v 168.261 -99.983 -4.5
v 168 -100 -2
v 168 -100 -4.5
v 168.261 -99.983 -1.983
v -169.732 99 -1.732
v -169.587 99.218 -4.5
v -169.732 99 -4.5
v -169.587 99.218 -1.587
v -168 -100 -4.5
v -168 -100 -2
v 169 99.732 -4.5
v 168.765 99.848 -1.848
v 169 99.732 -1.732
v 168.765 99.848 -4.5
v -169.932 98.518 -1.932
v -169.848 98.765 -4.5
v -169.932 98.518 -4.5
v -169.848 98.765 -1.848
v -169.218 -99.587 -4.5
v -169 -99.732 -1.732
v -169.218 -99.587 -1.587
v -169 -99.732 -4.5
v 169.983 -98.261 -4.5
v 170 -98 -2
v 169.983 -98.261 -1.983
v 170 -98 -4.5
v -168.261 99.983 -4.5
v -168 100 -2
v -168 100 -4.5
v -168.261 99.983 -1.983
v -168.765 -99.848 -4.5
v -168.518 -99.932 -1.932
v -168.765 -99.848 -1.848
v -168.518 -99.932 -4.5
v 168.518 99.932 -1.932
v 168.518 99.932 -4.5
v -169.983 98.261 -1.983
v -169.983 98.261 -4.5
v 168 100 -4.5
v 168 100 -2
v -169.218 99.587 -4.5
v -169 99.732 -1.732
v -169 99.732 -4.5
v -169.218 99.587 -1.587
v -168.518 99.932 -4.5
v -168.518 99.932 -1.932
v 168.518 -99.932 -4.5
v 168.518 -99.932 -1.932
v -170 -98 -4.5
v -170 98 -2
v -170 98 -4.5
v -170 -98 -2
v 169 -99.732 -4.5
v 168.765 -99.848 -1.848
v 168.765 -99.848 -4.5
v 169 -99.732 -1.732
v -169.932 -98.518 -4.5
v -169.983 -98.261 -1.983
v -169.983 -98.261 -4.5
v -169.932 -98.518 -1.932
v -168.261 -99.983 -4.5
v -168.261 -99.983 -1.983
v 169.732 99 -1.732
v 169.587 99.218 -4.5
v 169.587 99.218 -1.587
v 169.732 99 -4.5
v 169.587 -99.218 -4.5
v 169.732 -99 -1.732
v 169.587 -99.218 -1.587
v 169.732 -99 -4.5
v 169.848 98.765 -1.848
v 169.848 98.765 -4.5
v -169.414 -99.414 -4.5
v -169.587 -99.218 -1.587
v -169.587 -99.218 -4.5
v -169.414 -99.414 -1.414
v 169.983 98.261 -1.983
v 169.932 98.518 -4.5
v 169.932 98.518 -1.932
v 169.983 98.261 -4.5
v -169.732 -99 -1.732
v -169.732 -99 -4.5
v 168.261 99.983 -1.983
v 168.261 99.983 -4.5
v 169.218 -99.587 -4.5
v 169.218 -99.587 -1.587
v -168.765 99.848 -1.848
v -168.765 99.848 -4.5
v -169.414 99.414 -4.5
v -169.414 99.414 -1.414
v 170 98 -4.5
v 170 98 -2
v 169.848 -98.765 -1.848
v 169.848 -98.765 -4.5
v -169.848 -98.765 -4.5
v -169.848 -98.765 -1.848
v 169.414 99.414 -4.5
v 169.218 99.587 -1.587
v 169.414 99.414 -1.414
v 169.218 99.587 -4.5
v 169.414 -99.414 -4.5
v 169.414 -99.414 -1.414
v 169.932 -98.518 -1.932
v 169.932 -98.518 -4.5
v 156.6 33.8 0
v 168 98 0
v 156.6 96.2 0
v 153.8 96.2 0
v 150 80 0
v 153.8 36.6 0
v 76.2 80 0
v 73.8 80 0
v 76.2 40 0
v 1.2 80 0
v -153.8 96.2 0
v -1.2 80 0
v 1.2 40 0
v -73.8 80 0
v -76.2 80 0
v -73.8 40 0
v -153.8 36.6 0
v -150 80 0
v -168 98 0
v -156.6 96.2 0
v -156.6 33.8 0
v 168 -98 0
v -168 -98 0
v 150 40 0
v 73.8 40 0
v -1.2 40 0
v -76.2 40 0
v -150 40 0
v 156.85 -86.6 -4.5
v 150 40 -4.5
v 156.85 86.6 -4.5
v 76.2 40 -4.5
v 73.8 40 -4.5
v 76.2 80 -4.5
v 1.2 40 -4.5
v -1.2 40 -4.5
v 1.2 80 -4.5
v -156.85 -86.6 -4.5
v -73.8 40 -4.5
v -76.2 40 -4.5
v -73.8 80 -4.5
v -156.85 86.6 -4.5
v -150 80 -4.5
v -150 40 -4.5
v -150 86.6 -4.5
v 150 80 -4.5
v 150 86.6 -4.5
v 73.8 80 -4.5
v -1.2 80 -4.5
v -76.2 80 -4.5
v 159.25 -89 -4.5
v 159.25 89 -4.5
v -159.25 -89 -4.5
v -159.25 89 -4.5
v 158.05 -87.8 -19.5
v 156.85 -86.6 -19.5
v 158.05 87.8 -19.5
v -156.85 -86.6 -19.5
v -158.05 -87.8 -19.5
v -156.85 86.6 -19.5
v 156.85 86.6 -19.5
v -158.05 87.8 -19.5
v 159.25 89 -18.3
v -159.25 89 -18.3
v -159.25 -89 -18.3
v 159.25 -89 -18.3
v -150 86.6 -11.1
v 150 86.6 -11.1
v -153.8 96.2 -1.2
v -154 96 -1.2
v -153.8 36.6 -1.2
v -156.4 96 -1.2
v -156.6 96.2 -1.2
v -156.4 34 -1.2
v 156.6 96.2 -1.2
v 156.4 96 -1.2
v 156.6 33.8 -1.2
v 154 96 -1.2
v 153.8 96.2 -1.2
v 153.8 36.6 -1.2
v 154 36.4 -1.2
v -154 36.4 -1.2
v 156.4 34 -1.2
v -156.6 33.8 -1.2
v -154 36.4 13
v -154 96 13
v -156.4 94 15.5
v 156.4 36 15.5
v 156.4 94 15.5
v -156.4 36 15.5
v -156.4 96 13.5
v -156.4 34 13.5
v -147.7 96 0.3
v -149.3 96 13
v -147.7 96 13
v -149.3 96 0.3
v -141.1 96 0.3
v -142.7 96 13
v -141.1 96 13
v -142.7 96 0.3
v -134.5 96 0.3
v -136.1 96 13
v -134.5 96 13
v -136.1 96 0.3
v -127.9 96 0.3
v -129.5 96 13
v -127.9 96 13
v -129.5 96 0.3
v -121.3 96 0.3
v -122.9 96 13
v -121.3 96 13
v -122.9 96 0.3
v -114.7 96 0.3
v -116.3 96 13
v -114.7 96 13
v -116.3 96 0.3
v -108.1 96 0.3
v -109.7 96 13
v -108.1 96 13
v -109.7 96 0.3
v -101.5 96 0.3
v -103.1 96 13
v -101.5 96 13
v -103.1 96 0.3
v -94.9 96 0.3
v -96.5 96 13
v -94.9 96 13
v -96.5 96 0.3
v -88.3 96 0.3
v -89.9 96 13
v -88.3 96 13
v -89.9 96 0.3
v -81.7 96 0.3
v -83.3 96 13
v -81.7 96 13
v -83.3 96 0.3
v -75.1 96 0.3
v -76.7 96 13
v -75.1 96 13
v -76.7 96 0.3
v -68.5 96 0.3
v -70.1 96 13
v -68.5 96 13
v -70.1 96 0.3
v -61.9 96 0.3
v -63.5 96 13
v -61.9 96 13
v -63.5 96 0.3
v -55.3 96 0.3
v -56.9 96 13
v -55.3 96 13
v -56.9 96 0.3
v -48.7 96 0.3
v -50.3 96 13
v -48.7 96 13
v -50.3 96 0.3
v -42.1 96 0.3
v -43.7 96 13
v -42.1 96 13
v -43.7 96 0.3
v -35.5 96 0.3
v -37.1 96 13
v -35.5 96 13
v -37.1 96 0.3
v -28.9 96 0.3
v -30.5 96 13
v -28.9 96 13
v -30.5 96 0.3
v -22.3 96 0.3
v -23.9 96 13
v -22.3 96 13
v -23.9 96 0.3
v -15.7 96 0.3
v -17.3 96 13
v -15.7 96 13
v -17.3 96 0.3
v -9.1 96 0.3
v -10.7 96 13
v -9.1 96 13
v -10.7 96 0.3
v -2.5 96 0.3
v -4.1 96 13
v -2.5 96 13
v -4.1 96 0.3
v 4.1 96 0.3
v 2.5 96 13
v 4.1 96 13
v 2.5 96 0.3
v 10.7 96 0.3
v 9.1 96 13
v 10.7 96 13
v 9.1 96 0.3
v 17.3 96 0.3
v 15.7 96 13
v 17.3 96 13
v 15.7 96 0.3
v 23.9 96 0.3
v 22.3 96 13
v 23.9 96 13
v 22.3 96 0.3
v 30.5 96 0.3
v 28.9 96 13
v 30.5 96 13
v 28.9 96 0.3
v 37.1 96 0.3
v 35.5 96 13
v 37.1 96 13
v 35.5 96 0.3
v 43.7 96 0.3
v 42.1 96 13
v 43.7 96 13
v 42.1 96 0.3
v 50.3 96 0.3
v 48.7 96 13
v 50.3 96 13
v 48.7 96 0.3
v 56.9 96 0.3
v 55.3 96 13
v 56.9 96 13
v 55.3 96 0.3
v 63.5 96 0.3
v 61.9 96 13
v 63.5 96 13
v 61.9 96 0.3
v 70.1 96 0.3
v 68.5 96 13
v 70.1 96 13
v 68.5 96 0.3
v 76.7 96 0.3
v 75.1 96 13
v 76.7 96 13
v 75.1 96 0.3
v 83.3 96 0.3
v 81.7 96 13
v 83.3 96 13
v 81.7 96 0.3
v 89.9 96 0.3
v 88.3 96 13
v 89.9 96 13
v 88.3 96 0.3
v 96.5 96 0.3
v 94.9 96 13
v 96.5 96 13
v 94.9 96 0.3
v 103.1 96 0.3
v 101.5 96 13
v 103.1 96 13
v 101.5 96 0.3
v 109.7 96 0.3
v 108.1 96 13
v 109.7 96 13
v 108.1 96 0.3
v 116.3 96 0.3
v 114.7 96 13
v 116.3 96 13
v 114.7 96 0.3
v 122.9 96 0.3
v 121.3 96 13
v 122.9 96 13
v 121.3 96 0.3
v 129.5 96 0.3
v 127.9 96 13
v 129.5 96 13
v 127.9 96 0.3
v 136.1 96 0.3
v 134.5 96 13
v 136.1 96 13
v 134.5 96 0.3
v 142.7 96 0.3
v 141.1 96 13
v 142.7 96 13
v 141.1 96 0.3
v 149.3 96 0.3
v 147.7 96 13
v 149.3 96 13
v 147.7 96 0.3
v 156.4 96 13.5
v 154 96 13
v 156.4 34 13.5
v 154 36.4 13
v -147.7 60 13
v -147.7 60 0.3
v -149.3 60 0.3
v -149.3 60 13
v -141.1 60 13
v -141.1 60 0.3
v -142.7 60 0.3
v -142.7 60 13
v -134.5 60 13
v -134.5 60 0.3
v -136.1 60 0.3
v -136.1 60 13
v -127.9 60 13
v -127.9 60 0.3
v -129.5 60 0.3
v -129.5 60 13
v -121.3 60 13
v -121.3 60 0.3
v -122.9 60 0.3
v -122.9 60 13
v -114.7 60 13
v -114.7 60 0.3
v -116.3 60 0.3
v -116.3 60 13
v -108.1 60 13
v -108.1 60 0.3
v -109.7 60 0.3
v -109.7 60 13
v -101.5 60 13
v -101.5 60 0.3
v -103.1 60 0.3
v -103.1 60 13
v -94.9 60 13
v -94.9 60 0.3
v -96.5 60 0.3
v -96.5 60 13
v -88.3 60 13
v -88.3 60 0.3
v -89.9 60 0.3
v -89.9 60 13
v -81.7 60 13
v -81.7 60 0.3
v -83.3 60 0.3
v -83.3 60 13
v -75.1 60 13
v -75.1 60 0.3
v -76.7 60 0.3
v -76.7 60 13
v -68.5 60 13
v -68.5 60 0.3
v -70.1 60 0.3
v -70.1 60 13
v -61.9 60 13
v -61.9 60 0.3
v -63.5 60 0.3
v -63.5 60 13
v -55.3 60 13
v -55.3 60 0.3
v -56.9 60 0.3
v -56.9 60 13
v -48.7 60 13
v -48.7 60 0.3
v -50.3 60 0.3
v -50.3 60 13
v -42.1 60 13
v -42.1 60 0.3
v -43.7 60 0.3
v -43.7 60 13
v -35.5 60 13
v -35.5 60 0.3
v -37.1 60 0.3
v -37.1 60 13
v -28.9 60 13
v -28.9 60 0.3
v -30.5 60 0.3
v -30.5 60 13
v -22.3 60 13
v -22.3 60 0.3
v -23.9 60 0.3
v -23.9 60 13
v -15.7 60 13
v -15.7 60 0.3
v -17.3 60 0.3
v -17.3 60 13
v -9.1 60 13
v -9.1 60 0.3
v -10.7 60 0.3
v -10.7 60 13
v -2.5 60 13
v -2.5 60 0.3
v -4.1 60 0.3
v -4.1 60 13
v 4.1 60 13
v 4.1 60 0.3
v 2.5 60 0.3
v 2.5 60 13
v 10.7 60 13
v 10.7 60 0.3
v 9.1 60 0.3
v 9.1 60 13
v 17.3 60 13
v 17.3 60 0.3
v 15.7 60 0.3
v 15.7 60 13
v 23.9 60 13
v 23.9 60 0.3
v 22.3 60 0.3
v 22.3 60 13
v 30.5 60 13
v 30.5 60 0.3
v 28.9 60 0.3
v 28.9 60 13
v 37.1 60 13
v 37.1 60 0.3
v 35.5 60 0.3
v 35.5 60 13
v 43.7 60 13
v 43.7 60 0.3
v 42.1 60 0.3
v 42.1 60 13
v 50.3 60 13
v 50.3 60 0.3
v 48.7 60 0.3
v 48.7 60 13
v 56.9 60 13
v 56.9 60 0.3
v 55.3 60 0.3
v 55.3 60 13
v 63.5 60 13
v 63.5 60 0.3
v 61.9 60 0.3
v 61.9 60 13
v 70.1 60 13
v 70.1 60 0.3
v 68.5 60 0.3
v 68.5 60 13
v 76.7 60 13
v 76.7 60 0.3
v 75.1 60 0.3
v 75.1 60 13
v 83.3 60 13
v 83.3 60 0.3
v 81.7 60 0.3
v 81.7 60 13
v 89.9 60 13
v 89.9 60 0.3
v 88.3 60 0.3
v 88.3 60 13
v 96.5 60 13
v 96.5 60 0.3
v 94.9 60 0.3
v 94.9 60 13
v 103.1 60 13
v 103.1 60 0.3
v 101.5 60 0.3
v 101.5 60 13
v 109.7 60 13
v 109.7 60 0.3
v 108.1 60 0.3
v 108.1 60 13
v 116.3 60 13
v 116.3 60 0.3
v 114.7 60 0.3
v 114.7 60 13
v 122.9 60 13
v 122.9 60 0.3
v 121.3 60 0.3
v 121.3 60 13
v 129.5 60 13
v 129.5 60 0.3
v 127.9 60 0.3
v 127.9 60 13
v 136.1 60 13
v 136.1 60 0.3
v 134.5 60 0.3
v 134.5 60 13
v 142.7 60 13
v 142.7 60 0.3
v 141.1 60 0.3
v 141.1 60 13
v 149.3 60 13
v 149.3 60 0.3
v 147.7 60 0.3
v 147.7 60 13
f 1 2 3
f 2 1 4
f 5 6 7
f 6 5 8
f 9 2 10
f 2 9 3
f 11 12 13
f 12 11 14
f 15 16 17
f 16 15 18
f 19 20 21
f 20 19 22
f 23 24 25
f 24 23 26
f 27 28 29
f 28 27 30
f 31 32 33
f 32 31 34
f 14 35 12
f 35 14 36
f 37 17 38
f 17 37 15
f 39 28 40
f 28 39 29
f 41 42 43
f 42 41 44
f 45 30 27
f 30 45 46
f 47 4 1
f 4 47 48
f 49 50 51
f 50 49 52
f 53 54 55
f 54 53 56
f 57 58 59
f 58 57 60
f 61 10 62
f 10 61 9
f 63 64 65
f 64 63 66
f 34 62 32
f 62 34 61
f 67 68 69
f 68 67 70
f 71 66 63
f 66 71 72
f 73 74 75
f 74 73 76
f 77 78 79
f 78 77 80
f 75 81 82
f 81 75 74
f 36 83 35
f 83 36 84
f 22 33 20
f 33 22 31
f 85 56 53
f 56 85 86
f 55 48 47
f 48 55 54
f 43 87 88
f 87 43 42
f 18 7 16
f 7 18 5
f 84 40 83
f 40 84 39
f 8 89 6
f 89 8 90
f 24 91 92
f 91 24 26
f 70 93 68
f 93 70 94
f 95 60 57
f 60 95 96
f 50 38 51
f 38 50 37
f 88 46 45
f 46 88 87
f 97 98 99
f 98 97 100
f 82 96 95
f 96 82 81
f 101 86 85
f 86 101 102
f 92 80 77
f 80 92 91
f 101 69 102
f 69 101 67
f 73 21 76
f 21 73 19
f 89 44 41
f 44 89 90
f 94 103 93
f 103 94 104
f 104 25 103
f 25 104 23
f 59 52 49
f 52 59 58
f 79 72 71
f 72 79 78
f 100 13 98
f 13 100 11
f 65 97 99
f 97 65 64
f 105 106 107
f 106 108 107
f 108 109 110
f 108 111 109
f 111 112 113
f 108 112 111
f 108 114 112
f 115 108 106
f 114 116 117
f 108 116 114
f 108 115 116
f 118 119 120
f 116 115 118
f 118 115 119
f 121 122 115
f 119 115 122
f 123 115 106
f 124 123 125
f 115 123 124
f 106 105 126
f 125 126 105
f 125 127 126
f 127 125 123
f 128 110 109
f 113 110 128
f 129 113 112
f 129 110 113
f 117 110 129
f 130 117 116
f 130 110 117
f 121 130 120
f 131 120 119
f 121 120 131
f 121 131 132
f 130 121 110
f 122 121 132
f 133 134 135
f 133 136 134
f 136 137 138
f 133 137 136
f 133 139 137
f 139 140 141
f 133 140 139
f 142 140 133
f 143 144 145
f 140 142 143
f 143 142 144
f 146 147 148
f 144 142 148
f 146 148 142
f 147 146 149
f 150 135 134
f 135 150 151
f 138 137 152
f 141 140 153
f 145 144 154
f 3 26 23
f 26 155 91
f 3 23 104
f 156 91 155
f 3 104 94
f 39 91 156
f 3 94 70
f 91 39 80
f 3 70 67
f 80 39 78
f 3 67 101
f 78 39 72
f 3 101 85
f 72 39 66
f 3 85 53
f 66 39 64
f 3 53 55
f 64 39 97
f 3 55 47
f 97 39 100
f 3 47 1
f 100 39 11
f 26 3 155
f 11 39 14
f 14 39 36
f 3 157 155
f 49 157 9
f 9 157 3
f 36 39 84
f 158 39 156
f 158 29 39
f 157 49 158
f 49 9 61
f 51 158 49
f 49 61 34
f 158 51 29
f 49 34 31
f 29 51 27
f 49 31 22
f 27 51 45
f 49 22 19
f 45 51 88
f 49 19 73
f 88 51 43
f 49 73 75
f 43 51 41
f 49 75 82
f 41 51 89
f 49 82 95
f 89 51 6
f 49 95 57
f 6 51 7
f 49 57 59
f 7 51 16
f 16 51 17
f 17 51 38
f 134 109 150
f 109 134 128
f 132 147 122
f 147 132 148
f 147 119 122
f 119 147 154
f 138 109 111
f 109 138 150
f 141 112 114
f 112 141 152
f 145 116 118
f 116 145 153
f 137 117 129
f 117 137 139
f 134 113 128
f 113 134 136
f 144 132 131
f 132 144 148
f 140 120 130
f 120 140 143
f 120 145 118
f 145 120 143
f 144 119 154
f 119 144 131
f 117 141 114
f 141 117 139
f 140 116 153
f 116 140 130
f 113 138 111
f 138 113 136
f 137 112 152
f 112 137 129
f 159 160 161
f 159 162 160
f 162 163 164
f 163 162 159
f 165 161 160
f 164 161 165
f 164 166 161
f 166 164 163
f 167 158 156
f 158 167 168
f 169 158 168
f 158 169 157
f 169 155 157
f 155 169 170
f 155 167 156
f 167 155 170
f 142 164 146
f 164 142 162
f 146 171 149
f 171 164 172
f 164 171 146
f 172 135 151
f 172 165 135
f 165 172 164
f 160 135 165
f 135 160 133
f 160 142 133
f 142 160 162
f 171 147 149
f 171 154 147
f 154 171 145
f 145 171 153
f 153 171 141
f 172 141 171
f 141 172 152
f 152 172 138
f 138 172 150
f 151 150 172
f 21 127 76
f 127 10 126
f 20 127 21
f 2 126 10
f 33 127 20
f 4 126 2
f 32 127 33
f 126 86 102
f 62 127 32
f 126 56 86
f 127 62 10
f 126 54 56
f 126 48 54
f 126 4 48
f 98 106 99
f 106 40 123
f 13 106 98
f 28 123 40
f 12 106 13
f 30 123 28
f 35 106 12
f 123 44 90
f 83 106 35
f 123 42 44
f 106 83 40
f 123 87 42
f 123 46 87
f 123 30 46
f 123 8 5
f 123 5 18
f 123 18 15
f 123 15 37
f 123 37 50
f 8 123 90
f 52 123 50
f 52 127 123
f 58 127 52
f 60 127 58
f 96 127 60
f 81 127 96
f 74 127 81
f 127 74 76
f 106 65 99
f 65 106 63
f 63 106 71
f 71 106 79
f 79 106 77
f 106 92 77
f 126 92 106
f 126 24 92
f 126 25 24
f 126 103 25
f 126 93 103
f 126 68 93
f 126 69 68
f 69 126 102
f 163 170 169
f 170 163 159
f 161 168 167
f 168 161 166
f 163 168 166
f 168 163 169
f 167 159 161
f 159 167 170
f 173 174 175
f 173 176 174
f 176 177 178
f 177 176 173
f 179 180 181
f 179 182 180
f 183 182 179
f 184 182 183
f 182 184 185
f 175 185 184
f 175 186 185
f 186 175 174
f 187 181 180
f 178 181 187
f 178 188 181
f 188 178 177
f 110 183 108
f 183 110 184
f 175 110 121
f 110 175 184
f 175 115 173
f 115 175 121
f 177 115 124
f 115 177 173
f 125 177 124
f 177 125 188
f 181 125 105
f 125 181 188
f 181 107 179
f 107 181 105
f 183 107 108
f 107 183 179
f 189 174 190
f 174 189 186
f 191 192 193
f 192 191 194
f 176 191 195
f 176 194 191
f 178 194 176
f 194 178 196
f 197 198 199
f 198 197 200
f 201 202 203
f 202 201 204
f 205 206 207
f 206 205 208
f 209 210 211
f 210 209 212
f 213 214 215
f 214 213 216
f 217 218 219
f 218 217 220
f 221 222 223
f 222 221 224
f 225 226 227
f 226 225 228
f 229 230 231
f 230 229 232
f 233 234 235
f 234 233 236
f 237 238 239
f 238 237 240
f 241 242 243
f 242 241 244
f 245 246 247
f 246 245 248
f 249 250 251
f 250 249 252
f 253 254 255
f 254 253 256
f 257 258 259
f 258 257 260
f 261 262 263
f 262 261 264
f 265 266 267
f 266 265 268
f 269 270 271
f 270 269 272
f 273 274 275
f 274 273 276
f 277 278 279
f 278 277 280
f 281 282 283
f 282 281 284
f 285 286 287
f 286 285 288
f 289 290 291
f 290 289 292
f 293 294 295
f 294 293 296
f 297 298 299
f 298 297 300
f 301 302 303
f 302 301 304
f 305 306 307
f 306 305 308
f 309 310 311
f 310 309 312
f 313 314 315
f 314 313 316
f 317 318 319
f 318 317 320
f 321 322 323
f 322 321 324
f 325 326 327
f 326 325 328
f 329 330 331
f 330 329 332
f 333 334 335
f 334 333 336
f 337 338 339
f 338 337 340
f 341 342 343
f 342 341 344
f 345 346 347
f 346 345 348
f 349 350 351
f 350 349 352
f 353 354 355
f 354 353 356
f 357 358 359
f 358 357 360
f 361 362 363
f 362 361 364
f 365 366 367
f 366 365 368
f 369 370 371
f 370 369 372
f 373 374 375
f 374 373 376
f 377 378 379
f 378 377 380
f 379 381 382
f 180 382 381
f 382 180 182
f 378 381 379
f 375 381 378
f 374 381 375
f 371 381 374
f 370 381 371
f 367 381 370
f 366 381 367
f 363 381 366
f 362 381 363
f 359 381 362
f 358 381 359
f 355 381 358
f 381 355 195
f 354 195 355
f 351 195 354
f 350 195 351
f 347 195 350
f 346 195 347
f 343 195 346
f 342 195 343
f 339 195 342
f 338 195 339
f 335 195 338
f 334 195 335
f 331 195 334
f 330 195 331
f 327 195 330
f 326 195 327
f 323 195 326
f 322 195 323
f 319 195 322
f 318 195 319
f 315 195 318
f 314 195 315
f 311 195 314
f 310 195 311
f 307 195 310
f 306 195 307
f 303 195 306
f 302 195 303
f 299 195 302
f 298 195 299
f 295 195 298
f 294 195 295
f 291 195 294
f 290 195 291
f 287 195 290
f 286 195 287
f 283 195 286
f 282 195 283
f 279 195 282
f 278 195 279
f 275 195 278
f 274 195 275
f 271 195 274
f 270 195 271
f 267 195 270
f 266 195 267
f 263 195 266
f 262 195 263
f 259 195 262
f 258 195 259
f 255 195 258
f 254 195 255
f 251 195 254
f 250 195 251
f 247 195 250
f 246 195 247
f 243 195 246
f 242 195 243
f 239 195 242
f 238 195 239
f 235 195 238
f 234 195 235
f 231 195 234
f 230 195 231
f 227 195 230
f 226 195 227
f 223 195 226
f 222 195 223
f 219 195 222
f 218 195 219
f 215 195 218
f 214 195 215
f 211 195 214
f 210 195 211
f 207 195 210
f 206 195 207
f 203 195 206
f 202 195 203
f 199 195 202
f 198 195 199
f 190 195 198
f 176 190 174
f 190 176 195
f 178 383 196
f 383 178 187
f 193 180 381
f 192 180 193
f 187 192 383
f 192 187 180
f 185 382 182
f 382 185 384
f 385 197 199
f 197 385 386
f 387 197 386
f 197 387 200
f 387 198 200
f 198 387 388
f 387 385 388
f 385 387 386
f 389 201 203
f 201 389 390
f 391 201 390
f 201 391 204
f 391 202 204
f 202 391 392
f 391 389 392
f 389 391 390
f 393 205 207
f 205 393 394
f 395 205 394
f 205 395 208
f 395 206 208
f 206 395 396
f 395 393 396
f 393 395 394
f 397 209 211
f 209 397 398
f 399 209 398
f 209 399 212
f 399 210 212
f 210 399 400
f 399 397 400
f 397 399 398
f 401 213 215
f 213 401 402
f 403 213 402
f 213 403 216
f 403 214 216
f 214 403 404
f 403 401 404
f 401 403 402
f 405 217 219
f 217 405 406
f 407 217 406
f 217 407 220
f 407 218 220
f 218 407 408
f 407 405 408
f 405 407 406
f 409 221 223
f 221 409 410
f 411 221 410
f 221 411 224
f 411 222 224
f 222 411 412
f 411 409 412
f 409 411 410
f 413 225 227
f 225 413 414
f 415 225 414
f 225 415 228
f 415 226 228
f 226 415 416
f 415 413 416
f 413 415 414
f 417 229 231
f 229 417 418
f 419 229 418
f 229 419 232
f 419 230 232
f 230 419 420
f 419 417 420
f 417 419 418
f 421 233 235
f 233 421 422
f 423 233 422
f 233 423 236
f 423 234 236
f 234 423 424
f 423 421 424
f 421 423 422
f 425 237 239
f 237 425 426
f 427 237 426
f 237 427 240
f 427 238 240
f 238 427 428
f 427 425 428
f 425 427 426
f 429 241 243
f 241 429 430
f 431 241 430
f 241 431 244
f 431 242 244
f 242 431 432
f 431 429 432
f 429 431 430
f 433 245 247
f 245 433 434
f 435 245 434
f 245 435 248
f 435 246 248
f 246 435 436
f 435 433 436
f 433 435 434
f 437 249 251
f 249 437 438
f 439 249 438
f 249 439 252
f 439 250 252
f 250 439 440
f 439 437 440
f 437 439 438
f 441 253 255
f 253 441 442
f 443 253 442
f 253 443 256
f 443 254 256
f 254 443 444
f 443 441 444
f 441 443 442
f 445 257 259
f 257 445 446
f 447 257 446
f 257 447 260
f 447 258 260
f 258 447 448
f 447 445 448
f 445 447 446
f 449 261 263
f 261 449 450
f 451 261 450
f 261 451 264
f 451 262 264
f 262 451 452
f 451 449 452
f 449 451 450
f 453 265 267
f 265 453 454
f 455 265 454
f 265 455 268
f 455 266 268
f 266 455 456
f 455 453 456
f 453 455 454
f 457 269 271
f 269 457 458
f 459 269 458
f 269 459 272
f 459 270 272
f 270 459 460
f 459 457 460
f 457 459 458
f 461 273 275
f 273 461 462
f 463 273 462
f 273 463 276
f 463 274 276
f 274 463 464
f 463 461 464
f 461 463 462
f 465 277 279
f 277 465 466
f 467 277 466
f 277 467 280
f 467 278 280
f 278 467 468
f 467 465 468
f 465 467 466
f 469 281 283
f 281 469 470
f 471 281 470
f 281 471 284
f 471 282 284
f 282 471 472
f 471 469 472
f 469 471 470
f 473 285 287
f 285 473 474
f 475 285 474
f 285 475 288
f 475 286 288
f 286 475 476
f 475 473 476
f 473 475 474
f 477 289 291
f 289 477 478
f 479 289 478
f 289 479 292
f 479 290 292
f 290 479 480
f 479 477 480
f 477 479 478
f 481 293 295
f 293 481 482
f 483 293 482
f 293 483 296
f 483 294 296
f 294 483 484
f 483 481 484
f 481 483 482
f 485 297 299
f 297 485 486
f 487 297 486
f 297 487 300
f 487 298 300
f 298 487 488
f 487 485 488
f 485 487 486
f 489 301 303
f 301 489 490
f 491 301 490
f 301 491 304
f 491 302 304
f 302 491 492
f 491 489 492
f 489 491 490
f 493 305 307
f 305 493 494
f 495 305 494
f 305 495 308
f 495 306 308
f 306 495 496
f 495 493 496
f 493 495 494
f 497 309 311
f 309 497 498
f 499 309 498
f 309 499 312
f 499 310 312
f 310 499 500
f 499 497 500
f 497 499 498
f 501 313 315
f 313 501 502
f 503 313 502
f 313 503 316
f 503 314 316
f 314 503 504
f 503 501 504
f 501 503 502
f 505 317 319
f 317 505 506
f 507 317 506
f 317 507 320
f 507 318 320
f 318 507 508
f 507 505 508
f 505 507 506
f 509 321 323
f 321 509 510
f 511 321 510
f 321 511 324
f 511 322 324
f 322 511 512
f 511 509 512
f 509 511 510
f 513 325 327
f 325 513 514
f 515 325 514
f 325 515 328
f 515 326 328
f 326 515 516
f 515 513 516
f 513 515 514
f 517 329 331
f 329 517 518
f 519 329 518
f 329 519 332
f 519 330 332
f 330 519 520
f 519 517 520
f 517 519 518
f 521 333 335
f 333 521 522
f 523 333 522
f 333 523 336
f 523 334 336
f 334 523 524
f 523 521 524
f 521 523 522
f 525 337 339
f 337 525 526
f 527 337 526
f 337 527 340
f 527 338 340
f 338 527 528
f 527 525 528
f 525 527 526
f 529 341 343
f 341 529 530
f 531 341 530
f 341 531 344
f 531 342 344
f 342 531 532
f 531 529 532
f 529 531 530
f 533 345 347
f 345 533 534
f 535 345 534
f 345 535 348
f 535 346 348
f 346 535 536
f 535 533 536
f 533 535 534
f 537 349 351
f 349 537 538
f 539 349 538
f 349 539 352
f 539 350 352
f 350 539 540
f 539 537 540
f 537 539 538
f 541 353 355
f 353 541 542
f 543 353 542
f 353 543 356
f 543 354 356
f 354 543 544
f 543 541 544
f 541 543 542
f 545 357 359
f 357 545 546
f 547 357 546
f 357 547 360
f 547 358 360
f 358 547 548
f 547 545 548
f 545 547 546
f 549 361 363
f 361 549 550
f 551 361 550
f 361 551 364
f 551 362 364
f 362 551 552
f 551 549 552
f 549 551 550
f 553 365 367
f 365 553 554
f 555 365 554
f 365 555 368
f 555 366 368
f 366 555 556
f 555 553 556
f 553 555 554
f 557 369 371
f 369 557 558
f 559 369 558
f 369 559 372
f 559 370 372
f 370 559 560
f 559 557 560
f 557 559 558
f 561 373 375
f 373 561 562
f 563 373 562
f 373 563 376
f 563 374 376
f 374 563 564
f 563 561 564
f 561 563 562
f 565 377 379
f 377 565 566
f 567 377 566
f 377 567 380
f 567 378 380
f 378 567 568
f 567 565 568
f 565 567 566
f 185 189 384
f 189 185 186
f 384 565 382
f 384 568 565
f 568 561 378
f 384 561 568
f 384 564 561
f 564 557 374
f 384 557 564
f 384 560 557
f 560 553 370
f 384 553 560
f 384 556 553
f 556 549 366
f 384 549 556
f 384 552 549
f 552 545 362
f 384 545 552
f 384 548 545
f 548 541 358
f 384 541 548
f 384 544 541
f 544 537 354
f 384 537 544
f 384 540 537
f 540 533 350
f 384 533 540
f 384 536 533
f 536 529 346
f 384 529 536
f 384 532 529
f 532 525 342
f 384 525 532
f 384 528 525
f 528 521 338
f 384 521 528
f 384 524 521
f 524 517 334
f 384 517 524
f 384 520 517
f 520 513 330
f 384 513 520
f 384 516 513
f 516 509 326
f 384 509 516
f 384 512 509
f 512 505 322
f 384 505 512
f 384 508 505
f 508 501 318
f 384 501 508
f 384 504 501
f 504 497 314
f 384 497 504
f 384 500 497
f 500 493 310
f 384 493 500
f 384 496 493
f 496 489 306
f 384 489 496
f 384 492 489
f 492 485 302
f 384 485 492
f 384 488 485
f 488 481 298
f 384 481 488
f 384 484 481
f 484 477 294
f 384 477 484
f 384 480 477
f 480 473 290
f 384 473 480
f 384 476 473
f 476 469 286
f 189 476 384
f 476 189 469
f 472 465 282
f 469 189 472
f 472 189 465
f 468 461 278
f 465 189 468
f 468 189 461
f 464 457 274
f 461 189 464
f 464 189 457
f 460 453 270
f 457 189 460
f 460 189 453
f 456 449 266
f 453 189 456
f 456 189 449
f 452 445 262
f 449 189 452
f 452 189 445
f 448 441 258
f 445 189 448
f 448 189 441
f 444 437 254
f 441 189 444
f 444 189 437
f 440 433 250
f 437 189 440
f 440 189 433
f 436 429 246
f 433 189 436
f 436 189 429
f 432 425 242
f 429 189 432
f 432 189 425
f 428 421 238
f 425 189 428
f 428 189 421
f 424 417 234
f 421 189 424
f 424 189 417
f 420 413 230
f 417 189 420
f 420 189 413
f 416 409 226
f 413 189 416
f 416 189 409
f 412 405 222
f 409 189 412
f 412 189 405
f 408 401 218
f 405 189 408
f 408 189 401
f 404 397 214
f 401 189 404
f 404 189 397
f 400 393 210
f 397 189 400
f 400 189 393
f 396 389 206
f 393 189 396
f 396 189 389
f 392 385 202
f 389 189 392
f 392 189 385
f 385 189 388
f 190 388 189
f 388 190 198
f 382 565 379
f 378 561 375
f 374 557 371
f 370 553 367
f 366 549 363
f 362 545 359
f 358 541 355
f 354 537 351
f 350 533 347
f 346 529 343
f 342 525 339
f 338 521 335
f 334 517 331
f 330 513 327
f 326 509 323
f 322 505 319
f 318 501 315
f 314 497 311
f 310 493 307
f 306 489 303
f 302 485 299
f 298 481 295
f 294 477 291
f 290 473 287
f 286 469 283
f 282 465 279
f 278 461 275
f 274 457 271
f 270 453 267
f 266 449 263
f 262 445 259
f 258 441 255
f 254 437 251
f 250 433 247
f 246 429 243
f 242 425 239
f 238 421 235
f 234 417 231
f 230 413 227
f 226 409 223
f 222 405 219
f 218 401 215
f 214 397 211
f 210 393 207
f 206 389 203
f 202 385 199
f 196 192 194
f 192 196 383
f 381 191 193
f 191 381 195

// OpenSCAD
// ============================================================
// Hallway 90-degree DIVERTER vent - cabinet sits over the register.
// Problem: floor register is fully under a cabinet (air gaps only at the
// four corners, ~20 cm); straight-up flow is blocked. This cover seals the
// top and BENDS the flow 90 deg about the LONG axis: air exits horizontally
// through a low scoop hood along the room-facing long edge, thrown along
// the floor toward the open room (away from the closet side).
//
// MEASUREMENTS (taken on site):
//   floor-plane opening 320 x 180, dropdown (duct) 300 x 160 at a measured
//   18-20 mm below floor top (worst case 18 used). Old grill 355 x 204 flange / 275 x 125 louver area.
//
// TWO-PIECE (print-physics driven): a one-piece raised hood cannot print
// support-free top-face-down (plate would float 15 mm above the bed -
// playbook rule: re-check every feature in PRINT orientation).
//   PAN  - flush drop-in: 10 mm lip, 4.5 plate, skirt into the 320x180
//          opening, 300 x 40 slot at the room edge, 45-deg corner deflector
//          turning the plenum flow up into the slot.
//          Print TOP FACE DOWN, flat, zero supports (house pattern).
//   HOOD - low scoop over the slot, 20 mm total above floor (user cap),
//          open room-facing side with deep vertical straightening fins,
//          gaps <= 5 mm (finger-safety rule).
//          Print ROOF FACE DOWN, zero supports; both show faces get PEI
//          texture. Walls drop into a locating groove in the pan; CA glue.
// AIR DIRECTION: exits toward +Y. Install with +Y facing the open room.
// Material: PETG (heater supply). 0.2 mm, 4 walls.
// Design orientation: pan plate top z=0, pan extends -z, hood extends +z.
// ============================================================

/* [What to render] */
RENDER_PART = "assembly";   // ["pan", "hood", "assembly", "plinth"]

/* [Opening - CONFIRM BY MEASURE] */
floor_open_L = 320;   // x, long axis, opening in the floor plane
floor_open_W = 180;   // y
ledge_depth  = 18.0;  // floor top down to the 300x160 ledge -
                      // MEASURED 18-20 mm (correction from an early "~1 inch" estimate);
                      // sized to the WORST CASE 18 (playbook rule)
duct_L = 300; duct_W = 160;
end_clear  = 0.75;    // skirt clearance per end
side_clear = 1.0;     // skirt clearance per side

/* [Pan body] */
lip_w   = 10.0;       // floor-resting lip all around
plate_T = 4.5;
skirt_depth = 15.0;   // below floor plane; must clear the 18 mm ledge
skirt_wall  = 2.4;
edge_ch = 2.0; corner_r = 2.0;

/* [Slot + deflector] */
slot_L  = 300;        // x extent of the slot (centered)
slot_y0 = 40;         // slot near edge (closet side of slot)
slot_y1 = 80;         // slot far edge (room side)
n_slot_ribs = 3;      // full-thickness ribs bracing the slot span
slot_rib_t  = 2.4;

/* [Hood] */
scoop_cap  = 20.0;    // max height above FLOOR plane (user limit)
hood_wall  = 2.4;
roof_T     = 2.5;
hood_y0    = 34;      // back wall outer face (closet side)
hood_y1    = 96;      // open outlet face (room side)
hood_margin_x = 4;    // hood extends past slot ends
groove_depth = 1.2; groove_clear = 0.2;
fin_t = 1.6;
fin_gap = 5.0;        // FINGER SAFETY <= 5
fin_y0 = 60;          // fins run fin_y0 .. hood_y1 (deep = straight throw)
fin_z_clear = 0.3;    // fin bottom vs plate top
hood_edge_ch = 2.0;

// ---------------- derived ----------------
plate_L = floor_open_L + 2*lip_w;            // 340
plate_W = floor_open_W + 2*lip_w;            // 200
skirt_L = floor_open_L - 2*end_clear;        // 318.5
skirt_W = floor_open_W - 2*side_clear;       // 178
skirt_in_L = skirt_L - 2*skirt_wall;
skirt_in_W = skirt_W - 2*skirt_wall;
hood_h  = scoop_cap - plate_T;               // 15.5 above plate top
hood_L  = slot_L + 2*(hood_wall + hood_margin_x);   // 312.8 (a stale "308" here once named an export file; see README)
hood_D  = hood_y1 - hood_y0;                 // 62
fin_pitch = fin_gap + fin_t;                 // 6.6
fin_H   = hood_h - roof_T;                   // 13 (roof underside to plate)
n_fins  = floor((hood_L - 2*hood_wall - fin_gap) / fin_pitch);
fins_span = n_fins*fin_pitch + fin_t;
defl_d  = skirt_in_W/2 - slot_y1;            // corner-fillet wedge depth
$fn = 48;

assert(plate_L <= 350 && plate_W <= 320, "pan exceeds bed");
assert(hood_L <= 350 && hood_D <= 320, "hood exceeds bed");
assert(fin_gap <= 5.01, "finger-safety: fin gap > 5");
assert(skirt_depth <= ledge_depth - 2, "skirt hits the ledge");
assert(slot_L/2 <= skirt_in_L/2 - 2 && slot_y1 <= skirt_in_W/2 - 2,
       "slot exceeds skirt interior");
assert(hood_y0 + hood_wall + groove_clear < slot_y0,
       "back-wall groove intersects slot");
assert(hood_L/2 - hood_wall - groove_clear > slot_L/2 + 1,
       "end-wall groove too close to slot end");
assert(hood_L/2 <= plate_L/2 - 2 && hood_y1 <= plate_W/2 - 2,
       "hood exceeds plate");
assert(plate_T + hood_h <= scoop_cap + 0.01, "scoop over user height cap");
echo(str("outlet free area ~",
     round((hood_L - 2*hood_wall - ((n_fins+1)*fin_t)) * fin_H / 100),
     " cm2  (slot ", round((slot_L*(slot_y1-slot_y0)
       - n_slot_ribs*slot_rib_t*(slot_y1-slot_y0))/100),
     " cm2, duct ", round(duct_L*duct_W/100), " cm2)"));
echo(str("n_fins ", n_fins, "  hood total above floor ", plate_T + hood_h));

// ---------------- helpers ----------------
module ch_x(y, z, c, l) { translate([0, y, z]) rotate([45, 0, 0])
    cube([l, c*sqrt(2), c*sqrt(2)], center=true); }
module ch_y(x, z, c, l) { translate([x, 0, z]) rotate([0, 0, 90]) rotate([45, 0, 0])
    cube([l, c*sqrt(2), c*sqrt(2)], center=true); }
module rrect(l, w, r) { offset(r=r) offset(delta=-r) square([l, w], center=true); }

// ============================================================ PAN
module pan_plate() {
    difference() {
        translate([0, 0, -plate_T]) linear_extrude(plate_T)
            rrect(plate_L, plate_W, corner_r);
        // slot (ribs re-added after)
        translate([-slot_L/2, slot_y0, -plate_T - 1])
            cube([slot_L, slot_y1 - slot_y0, plate_T + 2]);
    }
    // full-thickness ribs bracing the slot span (hidden under the hood)
    for (i = [1 : n_slot_ribs])
        translate([-slot_L/2 + i*slot_L/(n_slot_ribs+1) - slot_rib_t/2,
                   slot_y0, -plate_T])
            cube([slot_rib_t, slot_y1 - slot_y0, plate_T]);
}
module pan_skirt() {
    translate([0, 0, -plate_T - skirt_depth]) linear_extrude(skirt_depth)
        difference() { square([skirt_L, skirt_W], center=true);
                       square([skirt_in_L, skirt_in_W], center=true); }
}
// 45-deg wedge filling the dead-end between slot far edge and skirt wall:
// +y plenum flow hits it and turns up into the slot.
module deflector() {
    translate([-slot_L/2, 0, 0]) rotate([90, 0, 90]) linear_extrude(slot_L)
        polygon([[slot_y1, -plate_T], [skirt_in_W/2, -plate_T],
                 [skirt_in_W/2, -plate_T - defl_d]]);
}
// locating groove for hood back + end walls (front face is open)
module hood_groove() {
    gw = hood_wall + 2*groove_clear;
    translate([0, 0, -groove_depth]) linear_extrude(groove_depth + 1) {
        // back wall groove
        translate([-hood_L/2 - groove_clear, hood_y0 - groove_clear])
            square([hood_L + 2*groove_clear, gw]);
        // end wall grooves: wall sx=+1 spans x [hood_L/2-hood_wall, hood_L/2]
        for (sx = [-1, 1])
            translate([sx>0 ? hood_L/2 - hood_wall - groove_clear
                            : -hood_L/2 - groove_clear,
                       hood_y0 - groove_clear])
                square([gw, hood_D + 2*groove_clear]);
    }
}
module pan_chamfers() {
    ch_x(-plate_W/2, 0, edge_ch, plate_L + 4); ch_x(plate_W/2, 0, edge_ch, plate_L + 4);
    ch_y(-plate_L/2, 0, edge_ch, plate_W + 4); ch_y(plate_L/2, 0, edge_ch, plate_W + 4);
    // skirt lead-in
    ch_x(-skirt_W/2, -plate_T - skirt_depth, 1.2, skirt_L + 4);
    ch_x( skirt_W/2, -plate_T - skirt_depth, 1.2, skirt_L + 4);
    ch_y(-skirt_L/2, -plate_T - skirt_depth, 1.2, skirt_W + 4);
    ch_y( skirt_L/2, -plate_T - skirt_depth, 1.2, skirt_W + 4);
}
module pan() {
    difference() {
        union() { pan_plate(); pan_skirt(); deflector(); }
        pan_chamfers();
        hood_groove();
    }
}

// ============================================================ HOOD
// Modeled in ASSEMBLED position: walls z = -groove_depth .. hood_h,
// roof top at z = hood_h. Open face at y = hood_y1 (+y, room side).
module hood_body() {
    // back wall
    translate([-hood_L/2, hood_y0, -groove_depth])
        cube([hood_L, hood_wall, groove_depth + hood_h]);
    // end walls
    for (sx = [-1, 1])
        translate([sx*hood_L/2 - (sx>0 ? hood_wall : 0), hood_y0, -groove_depth])
            cube([hood_wall, hood_D, groove_depth + hood_h]);
    // roof
    translate([-hood_L/2, hood_y0, hood_h - roof_T])
        cube([hood_L, hood_D, roof_T]);
    // fins: vertical straighteners, fused to roof, deep along y
    fin_x0 = -fins_span/2;
    for (k = [0 : n_fins])
        translate([fin_x0 + k*fin_pitch, fin_y0, fin_z_clear])
            cube([fin_t, hood_y1 - fin_y0, hood_h - fin_z_clear]);
}
module hood_chamfers() {
    // roof top perimeter, 45 deg (prints flaring from bed, roof-down)
    ch_x(hood_y0, hood_h, hood_edge_ch, hood_L + 4);
    ch_x(hood_y1, hood_h, hood_edge_ch, hood_L + 4);
    ch_y(-hood_L/2, hood_h, hood_edge_ch, hood_D + 4);
    ch_y( hood_L/2, hood_h, hood_edge_ch, hood_D + 4);
}
module hood() {
    difference() {
        hood_body();
        hood_chamfers();
    }
}

// ============================================================ PLINTH
// TRUE ONE-PIECE alternative: the entire cover is a 20 mm low box -
// flat roof at the scoop cap height, perimeter walls resting on the
// floor, fins built into the room-facing long edge, skirt hanging into
// the opening. ONE print, no glue. Requires ~20 mm clearance under the
// cabinet across the WHOLE footprint (not just the scoop strip).
// Prints TOP FACE DOWN: the whole roof is layer 1 on the PEI; walls,
// skirt, ribs, fins all grow straight up. Zero supports.
// Airflow bonus vs two-piece: full-width 17.5 mm channel -> ~40 cm2.
// Coordinates: roof top z=0, part extends -z; floor plane z=-scoop_cap.
/* [Plinth] */
p_roof_T   = 2.5;
p_wall_t   = 2.4;
p_fin_field= 300;    // fin field length; outlet corners stay solid
p_fin_d    = 30;     // fin depth along y
p_floor_clear = 0.5; // fin bottoms vs floor
p_rib_d    = 12;     // internal roof ribs, depth below roof underside
p_n_ribs   = 7;
p_stub_len = 8;      // room-side skirt registration stubs at the ends;
                     // MUST stay outside the fin field or they block channels

p_H       = scoop_cap;                 // 20 above floor
p_floor_z = -p_H;
p_skirt_bot = p_floor_z - skirt_depth;
p_fin_H   = p_H - p_roof_T;            // 17.5 outlet height
p_n_fins  = floor((p_fin_field - fin_gap) / fin_pitch);
p_fins_span = p_n_fins*fin_pitch + fin_t;

assert(p_fin_field/2 + 2 < plate_L/2 - p_wall_t, "fin field hits end walls");
echo(str("plinth outlet ~",
     round((p_fin_field - (p_n_fins+1)*fin_t) * p_fin_H / 100),
     " cm2, one piece, ", p_H, " mm above floor"));

module p_roof() {
    translate([0, 0, -p_roof_T]) linear_extrude(p_roof_T)
        rrect(plate_L, plate_W, corner_r);
}
module p_walls() {   // closet long wall + both end walls + room-face corners
    difference() {
        translate([0, 0, p_floor_z]) linear_extrude(p_H - p_roof_T + 0.1)
            difference() {
                rrect(plate_L, plate_W, corner_r);
                rrect(plate_L - 2*p_wall_t, plate_W - 2*p_wall_t, 1);
            }
        // open the room face over the fin field only
        translate([-p_fin_field/2, plate_W/2 - p_wall_t - 1, p_floor_z - 1])
            cube([p_fin_field, p_wall_t + 3, p_H + 2]);
    }
}
module p_skirt() {   // 3 sides full (ends + closet); room side = end stubs
    // hangs from roof underside through the floor opening: also structure
    difference() {
        translate([0, 0, p_skirt_bot])
            linear_extrude(-p_roof_T - p_skirt_bot + 0.1)
            difference() { square([skirt_L, skirt_W], center=true);
                           square([skirt_in_L, skirt_in_W], center=true); }
        // remove room-side wall between the stubs
        translate([-(skirt_L/2 - skirt_wall - p_stub_len),
                   skirt_W/2 - skirt_wall - 1, p_skirt_bot - 1])
            cube([skirt_L - 2*skirt_wall - 2*p_stub_len, skirt_wall + 2,
                  -p_roof_T - p_skirt_bot + 2]);
    }
}
module p_fins() {
    fx0 = -p_fins_span/2;
    for (k = [0 : p_n_fins])
        translate([fx0 + k*fin_pitch, plate_W/2 - p_fin_d,
                   p_floor_z + p_floor_clear])
            cube([fin_t, p_fin_d - 0.5, p_H - p_roof_T - p_floor_clear + 0.1]);
}
module p_ribs() {    // stiffen the roof; parallel to flow (+y), stop before fins
    for (i = [1 : p_n_ribs])
        translate([-skirt_in_L/2 + i*skirt_in_L/(p_n_ribs+1) - slot_rib_t/2,
                   -(plate_W/2 - p_wall_t), -p_roof_T - p_rib_d])
            cube([slot_rib_t, plate_W - 2*p_wall_t - p_fin_d - 5, p_rib_d]);
}
module p_chamfers() {
    ch_x(-plate_W/2, 0, edge_ch, plate_L + 4); ch_x(plate_W/2, 0, edge_ch, plate_L + 4);
    ch_y(-plate_L/2, 0, edge_ch, plate_W + 4); ch_y(plate_L/2, 0, edge_ch, plate_W + 4);
    // skirt lead-in
    ch_x(-skirt_W/2, p_skirt_bot, 1.2, skirt_L + 4);
    ch_x( skirt_W/2, p_skirt_bot, 1.2, skirt_L + 4);
    ch_y(-skirt_L/2, p_skirt_bot, 1.2, skirt_W + 4);
    ch_y( skirt_L/2, p_skirt_bot, 1.2, skirt_W + 4);
}
module plinth() {
    difference() {
        union() { p_roof(); p_walls(); p_skirt(); p_fins(); p_ribs(); }
        p_chamfers();
    }
}

// ============================================================ render
if (RENDER_PART == "pan") pan();
if (RENDER_PART == "hood") hood();
if (RENDER_PART == "assembly") { pan(); hood(); }
if (RENDER_PART == "plinth") plinth();
